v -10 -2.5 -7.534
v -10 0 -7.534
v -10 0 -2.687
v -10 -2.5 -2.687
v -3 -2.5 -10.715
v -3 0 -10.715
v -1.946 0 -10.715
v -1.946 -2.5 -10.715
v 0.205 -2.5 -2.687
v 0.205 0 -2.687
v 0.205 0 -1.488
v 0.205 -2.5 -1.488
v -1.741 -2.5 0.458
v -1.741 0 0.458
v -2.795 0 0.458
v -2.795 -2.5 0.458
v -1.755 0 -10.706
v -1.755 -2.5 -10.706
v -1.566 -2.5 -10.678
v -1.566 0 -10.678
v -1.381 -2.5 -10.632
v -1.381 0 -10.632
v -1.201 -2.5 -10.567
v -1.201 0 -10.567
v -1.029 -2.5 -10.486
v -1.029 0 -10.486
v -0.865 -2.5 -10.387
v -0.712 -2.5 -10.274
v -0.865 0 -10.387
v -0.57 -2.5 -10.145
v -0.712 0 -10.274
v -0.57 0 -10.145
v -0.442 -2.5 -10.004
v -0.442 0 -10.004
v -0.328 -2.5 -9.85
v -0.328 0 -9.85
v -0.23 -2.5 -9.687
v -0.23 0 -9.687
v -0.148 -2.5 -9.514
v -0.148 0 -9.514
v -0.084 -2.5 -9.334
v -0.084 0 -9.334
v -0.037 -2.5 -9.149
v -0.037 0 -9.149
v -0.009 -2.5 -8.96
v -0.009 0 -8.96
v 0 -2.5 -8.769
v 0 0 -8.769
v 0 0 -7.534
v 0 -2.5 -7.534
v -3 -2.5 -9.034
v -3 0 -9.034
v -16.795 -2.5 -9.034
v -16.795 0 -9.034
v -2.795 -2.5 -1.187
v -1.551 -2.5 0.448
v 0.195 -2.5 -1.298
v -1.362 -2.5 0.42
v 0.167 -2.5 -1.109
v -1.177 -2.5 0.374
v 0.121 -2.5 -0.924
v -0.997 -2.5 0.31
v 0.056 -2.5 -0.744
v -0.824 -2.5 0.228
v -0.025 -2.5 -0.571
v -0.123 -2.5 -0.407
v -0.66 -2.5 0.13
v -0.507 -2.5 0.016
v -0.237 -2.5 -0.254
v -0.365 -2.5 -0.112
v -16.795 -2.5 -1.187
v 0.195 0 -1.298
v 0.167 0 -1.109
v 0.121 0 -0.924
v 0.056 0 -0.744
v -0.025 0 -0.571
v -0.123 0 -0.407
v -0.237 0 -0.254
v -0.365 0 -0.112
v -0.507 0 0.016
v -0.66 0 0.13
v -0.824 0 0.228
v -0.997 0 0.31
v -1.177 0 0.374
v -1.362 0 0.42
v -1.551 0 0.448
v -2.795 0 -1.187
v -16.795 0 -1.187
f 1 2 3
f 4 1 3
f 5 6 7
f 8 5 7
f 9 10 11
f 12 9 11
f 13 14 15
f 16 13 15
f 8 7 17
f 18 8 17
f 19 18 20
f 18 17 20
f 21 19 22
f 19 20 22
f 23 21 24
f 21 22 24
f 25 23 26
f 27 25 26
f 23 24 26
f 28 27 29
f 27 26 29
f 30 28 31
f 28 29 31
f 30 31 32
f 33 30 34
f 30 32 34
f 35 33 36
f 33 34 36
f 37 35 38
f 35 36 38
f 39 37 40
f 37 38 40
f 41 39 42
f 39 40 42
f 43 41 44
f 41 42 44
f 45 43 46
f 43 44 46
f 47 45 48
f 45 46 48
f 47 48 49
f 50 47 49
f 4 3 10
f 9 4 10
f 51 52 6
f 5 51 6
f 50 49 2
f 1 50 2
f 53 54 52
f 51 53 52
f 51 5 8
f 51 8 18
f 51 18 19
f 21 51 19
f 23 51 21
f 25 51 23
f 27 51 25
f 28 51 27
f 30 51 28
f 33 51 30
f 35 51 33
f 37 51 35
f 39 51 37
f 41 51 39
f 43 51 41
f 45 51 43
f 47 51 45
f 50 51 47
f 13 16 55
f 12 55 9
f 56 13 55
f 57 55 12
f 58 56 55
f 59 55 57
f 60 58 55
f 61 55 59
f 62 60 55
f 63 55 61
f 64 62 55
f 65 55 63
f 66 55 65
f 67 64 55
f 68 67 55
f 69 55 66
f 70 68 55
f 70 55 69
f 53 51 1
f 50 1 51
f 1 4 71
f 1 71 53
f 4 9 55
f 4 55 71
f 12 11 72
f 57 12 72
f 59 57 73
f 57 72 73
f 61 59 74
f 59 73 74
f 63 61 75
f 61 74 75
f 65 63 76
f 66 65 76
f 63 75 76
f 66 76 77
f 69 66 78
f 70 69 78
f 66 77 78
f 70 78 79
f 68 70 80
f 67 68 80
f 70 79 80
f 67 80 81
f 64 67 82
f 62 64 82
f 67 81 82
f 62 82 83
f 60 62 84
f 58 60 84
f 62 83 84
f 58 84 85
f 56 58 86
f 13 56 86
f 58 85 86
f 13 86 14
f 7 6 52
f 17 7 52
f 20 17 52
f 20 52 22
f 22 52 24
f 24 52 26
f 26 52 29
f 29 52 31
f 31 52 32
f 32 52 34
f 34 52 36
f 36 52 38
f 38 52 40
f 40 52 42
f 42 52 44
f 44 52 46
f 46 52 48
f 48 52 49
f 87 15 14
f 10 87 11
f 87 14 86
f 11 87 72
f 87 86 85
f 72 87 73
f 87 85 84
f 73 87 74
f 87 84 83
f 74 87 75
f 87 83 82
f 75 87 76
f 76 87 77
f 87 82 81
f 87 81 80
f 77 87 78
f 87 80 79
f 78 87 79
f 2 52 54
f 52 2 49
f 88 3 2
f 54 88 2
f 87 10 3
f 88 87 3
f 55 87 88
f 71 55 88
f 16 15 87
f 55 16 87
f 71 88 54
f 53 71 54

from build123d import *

# Parameters (mm, degrees)
F1_DEPTH = 2.5


# Not quite as in the source:
# - a feature names something its author has since deleted; it is built from what else it names


with BuildPart() as f1:
    # F0 (on Front) → F1 (new body)
    with BuildSketch(Plane.XZ):
        with BuildLine():
            Line((-16.7953648853, -9.0339062735), (-6.5833406376, -9.0339062735))
            Line((-6.5833406376, -9.0339062735), (-3, -9.0339062735))
            Line((-3, -9.0339062735), (-3, -10.7153228952))
            Line((-3, -10.7153228952), (-1.9461073071, -10.7153228952))
            ThreePointArc((-1.9461073071, -10.7153228952), (-0.5700016333, -10.1453212619), (0, -8.7692155881))
            Line((0, -8.7692155881), (0, -8.5))
            Line((0, -8.5), (0, -7.5339062735))
            Line((0, -7.5339062735), (-10, -7.5339062735))
            Line((-10, -7.5339062735), (-10, -2.6866213954))
            Line((-10, -2.6866213954), (0.2046351147, -2.6866213954))
            Line((0.2046351147, -2.6866213954), (0.2046351147, -1.7576624442))
            Line((0.2046351147, -1.7576624442), (0.2046351147, -1.4884468561))
            ThreePointArc((0.2046351147, -1.4884468561), (-0.3653665186, -0.1123411824), (-1.7414721924, 0.457660451))
            Line((-1.7414721924, 0.457660451), (-2.7953648853, 0.457660451))
            Line((-2.7953648853, 0.457660451), (-2.7953648853, -1.1866213954))
            Line((-2.7953648853, -1.1866213954), (-6.7360828114, -1.1866213954))
            Line((-6.7360828114, -1.1866213954), (-16.7953648853, -1.1866213954))
            Line((-16.7953648853, -1.1866213954), (-16.7953648853, -9.0339062735))
        make_face()
    extrude(amount=F1_DEPTH)


solid = f1.part
